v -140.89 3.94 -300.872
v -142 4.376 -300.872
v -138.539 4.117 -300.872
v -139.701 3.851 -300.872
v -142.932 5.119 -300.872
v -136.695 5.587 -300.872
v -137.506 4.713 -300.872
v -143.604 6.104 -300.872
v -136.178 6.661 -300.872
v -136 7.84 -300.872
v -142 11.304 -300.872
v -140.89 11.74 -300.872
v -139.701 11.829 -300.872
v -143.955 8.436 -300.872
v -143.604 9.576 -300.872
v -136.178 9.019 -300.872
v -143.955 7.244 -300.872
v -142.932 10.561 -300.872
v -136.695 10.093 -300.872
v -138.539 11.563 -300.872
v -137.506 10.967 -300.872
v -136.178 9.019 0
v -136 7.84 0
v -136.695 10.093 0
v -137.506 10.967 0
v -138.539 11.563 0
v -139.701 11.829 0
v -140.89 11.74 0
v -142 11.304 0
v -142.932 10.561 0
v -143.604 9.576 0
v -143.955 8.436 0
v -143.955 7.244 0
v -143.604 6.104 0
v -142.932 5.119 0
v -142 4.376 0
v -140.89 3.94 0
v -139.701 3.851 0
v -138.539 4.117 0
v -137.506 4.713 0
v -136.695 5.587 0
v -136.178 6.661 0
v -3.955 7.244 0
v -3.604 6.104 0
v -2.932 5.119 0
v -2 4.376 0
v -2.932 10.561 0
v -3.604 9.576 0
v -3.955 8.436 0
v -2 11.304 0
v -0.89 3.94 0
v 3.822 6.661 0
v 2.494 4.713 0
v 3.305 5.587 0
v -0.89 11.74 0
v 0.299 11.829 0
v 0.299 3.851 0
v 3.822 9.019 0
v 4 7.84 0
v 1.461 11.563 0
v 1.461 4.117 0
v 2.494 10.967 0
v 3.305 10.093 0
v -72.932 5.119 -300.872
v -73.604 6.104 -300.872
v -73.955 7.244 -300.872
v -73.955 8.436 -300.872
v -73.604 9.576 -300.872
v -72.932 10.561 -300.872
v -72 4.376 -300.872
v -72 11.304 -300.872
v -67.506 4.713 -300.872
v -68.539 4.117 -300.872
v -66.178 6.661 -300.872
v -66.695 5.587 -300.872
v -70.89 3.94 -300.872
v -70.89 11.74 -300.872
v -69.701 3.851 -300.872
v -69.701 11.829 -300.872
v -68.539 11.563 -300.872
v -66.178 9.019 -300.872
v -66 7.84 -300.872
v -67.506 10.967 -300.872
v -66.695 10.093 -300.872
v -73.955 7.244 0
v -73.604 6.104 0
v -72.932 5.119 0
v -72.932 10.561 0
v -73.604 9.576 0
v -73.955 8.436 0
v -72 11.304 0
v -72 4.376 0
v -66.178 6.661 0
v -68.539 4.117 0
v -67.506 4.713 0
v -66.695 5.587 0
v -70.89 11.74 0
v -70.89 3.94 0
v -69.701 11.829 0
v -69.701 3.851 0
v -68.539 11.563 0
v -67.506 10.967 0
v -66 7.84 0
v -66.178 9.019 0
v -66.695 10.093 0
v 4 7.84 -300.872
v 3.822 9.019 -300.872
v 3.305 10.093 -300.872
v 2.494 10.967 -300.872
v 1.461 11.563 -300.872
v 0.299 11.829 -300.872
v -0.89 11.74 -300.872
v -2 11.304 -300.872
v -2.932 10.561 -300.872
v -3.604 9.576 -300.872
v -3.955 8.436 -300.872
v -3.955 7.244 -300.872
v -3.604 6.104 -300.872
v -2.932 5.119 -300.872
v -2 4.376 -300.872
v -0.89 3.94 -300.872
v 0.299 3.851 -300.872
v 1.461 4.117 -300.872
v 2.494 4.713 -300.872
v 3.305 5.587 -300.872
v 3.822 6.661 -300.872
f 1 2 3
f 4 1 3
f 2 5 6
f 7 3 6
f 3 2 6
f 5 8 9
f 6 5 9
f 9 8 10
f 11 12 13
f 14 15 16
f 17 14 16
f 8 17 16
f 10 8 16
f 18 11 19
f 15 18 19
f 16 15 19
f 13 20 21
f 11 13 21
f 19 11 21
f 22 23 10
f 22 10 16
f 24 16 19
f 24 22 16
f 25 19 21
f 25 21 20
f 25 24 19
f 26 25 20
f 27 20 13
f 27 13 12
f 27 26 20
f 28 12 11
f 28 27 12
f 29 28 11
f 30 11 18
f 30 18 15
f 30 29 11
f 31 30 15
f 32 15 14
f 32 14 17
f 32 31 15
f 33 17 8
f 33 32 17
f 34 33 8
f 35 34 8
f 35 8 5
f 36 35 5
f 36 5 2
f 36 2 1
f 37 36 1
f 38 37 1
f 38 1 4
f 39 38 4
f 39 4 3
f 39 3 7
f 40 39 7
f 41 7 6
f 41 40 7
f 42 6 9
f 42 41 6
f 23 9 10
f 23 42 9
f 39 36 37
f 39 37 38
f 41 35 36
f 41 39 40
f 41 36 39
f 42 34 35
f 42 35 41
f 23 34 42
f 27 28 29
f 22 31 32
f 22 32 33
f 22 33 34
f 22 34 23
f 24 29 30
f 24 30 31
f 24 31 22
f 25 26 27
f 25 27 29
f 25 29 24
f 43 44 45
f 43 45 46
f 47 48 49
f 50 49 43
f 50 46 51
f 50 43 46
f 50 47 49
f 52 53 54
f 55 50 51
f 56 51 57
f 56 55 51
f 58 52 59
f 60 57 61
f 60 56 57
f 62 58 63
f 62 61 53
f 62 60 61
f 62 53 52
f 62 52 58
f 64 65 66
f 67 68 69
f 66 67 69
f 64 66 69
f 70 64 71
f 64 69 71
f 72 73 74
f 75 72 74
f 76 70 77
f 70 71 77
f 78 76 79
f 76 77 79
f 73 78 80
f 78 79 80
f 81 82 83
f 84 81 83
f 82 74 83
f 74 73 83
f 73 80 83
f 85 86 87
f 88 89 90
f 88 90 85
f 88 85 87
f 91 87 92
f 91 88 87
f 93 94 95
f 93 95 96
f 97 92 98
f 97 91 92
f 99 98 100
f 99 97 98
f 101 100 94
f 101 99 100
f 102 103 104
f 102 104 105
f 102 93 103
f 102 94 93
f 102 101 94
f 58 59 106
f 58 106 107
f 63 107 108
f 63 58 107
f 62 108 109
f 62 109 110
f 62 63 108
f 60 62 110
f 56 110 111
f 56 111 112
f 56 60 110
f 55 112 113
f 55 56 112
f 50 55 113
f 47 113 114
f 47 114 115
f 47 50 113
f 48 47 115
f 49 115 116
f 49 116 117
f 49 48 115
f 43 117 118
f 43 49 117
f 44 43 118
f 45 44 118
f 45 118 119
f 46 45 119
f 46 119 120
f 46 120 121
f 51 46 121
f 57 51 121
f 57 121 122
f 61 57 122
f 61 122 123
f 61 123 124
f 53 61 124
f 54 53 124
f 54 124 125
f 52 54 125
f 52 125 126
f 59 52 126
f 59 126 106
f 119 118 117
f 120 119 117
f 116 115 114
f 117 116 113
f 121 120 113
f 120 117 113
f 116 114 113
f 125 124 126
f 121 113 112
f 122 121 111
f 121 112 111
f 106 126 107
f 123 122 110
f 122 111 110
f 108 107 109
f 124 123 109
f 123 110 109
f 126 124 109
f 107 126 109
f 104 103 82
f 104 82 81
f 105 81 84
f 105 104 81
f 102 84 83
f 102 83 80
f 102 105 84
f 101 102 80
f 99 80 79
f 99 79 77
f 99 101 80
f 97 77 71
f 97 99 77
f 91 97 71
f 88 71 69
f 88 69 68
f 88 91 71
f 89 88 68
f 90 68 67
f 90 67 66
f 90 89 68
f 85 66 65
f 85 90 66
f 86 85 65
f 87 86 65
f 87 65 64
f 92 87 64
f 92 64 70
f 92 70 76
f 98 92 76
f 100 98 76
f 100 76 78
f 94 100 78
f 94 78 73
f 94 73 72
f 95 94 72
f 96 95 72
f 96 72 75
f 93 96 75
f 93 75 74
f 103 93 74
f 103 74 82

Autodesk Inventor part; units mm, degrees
ref_plane "YZ Plane" through (0, 0, 0) normal (1, 0, 0) x (0, 1, 0)
ref_plane "XZ Plane" through (0, 0, 0) normal (0, 1, 0) x (-1, 0, 0)
ref_plane "Work Plane1" through (-140, 0, 0) normal (0, 0, 1) x (1, 0, 0)
sketch "Sketch1" plane through (-140, 0, 0) normal (0, 0, 1) x (1, 0, 0)
  circle A0 centre (0, 7.84) radius 4 projected
  circle A1 centre (140, 7.84) radius 4 projected
  circle A2 centre (70, 7.84) radius 5 projected
  circle A3 centre (70, 7.84) radius 4
  point P0 (140, 0)
  dimension "d0" = 8
ref_plane "Work Plane2" through (-149.963, -13.75, -300.8725) normal (0, 0, -1) x (0, 1, 0)
extrude "Extrusion1" add sketch "Sketch1" against normal up to surface (300.8725 mm away) contours A0 | A1 | A3
properties part number "Y rails"
